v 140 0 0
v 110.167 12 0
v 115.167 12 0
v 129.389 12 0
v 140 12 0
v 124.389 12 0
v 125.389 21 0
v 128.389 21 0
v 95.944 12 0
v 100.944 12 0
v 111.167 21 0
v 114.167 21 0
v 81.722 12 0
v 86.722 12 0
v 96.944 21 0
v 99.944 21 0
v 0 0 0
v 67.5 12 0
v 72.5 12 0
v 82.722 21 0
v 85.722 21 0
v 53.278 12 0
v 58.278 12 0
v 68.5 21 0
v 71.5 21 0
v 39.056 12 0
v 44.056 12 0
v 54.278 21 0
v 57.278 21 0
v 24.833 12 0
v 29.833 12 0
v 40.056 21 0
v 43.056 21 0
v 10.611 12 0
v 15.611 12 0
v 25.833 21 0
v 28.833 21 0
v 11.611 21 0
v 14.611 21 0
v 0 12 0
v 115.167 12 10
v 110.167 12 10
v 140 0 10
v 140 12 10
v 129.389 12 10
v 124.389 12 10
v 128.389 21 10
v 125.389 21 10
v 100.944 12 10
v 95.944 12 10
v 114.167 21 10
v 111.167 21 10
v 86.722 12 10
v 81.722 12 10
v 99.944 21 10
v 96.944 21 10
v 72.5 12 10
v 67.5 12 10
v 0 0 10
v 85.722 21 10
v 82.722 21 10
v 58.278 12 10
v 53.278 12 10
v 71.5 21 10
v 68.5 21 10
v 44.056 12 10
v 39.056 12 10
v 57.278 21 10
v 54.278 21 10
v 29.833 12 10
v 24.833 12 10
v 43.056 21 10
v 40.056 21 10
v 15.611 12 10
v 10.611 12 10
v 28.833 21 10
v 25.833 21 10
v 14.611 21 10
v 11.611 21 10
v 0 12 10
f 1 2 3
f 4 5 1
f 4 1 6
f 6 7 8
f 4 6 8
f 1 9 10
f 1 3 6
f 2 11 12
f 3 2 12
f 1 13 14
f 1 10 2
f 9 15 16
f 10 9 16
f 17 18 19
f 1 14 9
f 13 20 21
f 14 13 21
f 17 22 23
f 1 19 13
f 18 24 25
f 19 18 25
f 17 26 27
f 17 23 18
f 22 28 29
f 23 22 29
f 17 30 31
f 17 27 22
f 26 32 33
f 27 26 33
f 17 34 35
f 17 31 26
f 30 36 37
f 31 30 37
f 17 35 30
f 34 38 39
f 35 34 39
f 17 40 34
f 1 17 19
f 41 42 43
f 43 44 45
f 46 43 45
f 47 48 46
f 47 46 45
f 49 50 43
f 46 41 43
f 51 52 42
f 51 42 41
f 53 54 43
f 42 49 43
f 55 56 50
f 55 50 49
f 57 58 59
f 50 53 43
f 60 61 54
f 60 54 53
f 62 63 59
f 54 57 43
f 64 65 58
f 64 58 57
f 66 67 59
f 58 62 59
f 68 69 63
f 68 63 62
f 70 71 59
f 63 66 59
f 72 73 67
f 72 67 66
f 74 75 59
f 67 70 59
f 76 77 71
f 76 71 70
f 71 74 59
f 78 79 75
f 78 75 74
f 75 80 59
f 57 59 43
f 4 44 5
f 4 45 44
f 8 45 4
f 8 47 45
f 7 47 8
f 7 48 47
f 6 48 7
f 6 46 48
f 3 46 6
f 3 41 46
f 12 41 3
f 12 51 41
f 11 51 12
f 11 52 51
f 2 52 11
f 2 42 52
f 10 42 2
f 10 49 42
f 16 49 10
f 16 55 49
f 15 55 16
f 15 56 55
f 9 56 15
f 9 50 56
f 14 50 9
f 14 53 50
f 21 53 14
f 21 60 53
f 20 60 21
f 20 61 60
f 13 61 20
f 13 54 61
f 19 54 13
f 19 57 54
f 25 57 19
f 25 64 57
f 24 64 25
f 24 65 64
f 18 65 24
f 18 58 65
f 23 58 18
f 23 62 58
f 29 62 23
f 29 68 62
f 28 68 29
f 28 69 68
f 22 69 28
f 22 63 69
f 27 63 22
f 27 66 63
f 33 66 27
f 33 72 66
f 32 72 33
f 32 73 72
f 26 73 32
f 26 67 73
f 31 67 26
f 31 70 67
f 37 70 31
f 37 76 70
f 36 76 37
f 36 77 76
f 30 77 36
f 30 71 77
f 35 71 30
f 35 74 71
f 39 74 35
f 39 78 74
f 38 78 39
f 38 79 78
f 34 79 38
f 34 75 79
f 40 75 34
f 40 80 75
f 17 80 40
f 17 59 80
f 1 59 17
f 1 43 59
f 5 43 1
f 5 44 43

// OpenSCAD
$fn = 32;

// ----------------------------------------------------------------------
// Gear rack: 9 teeth on a 140 mm bar, pitch 14.22 mm
// ----------------------------------------------------------------------

// --- parameters (mm) ---
profile_height = 10;      // extrusion height
profile_points = 40;      // points of the closed outline

profile = [[0, 0], [140, 0], [140, 12], [129.389, 12], [128.389, 21], [125.389, 21], [124.389, 12], [115.167, 12], [114.167, 21], [111.167, 21], [110.167, 12], [100.944, 12], [99.944, 21], [96.944, 21], [95.944, 12], [86.722, 12], [85.722, 21], [82.722, 21], [81.722, 12], [72.5, 12], [71.5, 21], [68.5, 21], [67.5, 12], [58.278, 12], [57.278, 21], [54.278, 21], [53.278, 12], [44.056, 12], [43.056, 21], [40.056, 21], [39.056, 12], [29.833, 12], [28.833, 21], [25.833, 21], [24.833, 12], [15.611, 12], [14.611, 21], [11.611, 21], [10.611, 12], [0, 12]];  // single closed polygon, 40 points, counter clockwise

// --- the one profile operation ---
linear_extrude(height = profile_height) polygon(points = profile);
